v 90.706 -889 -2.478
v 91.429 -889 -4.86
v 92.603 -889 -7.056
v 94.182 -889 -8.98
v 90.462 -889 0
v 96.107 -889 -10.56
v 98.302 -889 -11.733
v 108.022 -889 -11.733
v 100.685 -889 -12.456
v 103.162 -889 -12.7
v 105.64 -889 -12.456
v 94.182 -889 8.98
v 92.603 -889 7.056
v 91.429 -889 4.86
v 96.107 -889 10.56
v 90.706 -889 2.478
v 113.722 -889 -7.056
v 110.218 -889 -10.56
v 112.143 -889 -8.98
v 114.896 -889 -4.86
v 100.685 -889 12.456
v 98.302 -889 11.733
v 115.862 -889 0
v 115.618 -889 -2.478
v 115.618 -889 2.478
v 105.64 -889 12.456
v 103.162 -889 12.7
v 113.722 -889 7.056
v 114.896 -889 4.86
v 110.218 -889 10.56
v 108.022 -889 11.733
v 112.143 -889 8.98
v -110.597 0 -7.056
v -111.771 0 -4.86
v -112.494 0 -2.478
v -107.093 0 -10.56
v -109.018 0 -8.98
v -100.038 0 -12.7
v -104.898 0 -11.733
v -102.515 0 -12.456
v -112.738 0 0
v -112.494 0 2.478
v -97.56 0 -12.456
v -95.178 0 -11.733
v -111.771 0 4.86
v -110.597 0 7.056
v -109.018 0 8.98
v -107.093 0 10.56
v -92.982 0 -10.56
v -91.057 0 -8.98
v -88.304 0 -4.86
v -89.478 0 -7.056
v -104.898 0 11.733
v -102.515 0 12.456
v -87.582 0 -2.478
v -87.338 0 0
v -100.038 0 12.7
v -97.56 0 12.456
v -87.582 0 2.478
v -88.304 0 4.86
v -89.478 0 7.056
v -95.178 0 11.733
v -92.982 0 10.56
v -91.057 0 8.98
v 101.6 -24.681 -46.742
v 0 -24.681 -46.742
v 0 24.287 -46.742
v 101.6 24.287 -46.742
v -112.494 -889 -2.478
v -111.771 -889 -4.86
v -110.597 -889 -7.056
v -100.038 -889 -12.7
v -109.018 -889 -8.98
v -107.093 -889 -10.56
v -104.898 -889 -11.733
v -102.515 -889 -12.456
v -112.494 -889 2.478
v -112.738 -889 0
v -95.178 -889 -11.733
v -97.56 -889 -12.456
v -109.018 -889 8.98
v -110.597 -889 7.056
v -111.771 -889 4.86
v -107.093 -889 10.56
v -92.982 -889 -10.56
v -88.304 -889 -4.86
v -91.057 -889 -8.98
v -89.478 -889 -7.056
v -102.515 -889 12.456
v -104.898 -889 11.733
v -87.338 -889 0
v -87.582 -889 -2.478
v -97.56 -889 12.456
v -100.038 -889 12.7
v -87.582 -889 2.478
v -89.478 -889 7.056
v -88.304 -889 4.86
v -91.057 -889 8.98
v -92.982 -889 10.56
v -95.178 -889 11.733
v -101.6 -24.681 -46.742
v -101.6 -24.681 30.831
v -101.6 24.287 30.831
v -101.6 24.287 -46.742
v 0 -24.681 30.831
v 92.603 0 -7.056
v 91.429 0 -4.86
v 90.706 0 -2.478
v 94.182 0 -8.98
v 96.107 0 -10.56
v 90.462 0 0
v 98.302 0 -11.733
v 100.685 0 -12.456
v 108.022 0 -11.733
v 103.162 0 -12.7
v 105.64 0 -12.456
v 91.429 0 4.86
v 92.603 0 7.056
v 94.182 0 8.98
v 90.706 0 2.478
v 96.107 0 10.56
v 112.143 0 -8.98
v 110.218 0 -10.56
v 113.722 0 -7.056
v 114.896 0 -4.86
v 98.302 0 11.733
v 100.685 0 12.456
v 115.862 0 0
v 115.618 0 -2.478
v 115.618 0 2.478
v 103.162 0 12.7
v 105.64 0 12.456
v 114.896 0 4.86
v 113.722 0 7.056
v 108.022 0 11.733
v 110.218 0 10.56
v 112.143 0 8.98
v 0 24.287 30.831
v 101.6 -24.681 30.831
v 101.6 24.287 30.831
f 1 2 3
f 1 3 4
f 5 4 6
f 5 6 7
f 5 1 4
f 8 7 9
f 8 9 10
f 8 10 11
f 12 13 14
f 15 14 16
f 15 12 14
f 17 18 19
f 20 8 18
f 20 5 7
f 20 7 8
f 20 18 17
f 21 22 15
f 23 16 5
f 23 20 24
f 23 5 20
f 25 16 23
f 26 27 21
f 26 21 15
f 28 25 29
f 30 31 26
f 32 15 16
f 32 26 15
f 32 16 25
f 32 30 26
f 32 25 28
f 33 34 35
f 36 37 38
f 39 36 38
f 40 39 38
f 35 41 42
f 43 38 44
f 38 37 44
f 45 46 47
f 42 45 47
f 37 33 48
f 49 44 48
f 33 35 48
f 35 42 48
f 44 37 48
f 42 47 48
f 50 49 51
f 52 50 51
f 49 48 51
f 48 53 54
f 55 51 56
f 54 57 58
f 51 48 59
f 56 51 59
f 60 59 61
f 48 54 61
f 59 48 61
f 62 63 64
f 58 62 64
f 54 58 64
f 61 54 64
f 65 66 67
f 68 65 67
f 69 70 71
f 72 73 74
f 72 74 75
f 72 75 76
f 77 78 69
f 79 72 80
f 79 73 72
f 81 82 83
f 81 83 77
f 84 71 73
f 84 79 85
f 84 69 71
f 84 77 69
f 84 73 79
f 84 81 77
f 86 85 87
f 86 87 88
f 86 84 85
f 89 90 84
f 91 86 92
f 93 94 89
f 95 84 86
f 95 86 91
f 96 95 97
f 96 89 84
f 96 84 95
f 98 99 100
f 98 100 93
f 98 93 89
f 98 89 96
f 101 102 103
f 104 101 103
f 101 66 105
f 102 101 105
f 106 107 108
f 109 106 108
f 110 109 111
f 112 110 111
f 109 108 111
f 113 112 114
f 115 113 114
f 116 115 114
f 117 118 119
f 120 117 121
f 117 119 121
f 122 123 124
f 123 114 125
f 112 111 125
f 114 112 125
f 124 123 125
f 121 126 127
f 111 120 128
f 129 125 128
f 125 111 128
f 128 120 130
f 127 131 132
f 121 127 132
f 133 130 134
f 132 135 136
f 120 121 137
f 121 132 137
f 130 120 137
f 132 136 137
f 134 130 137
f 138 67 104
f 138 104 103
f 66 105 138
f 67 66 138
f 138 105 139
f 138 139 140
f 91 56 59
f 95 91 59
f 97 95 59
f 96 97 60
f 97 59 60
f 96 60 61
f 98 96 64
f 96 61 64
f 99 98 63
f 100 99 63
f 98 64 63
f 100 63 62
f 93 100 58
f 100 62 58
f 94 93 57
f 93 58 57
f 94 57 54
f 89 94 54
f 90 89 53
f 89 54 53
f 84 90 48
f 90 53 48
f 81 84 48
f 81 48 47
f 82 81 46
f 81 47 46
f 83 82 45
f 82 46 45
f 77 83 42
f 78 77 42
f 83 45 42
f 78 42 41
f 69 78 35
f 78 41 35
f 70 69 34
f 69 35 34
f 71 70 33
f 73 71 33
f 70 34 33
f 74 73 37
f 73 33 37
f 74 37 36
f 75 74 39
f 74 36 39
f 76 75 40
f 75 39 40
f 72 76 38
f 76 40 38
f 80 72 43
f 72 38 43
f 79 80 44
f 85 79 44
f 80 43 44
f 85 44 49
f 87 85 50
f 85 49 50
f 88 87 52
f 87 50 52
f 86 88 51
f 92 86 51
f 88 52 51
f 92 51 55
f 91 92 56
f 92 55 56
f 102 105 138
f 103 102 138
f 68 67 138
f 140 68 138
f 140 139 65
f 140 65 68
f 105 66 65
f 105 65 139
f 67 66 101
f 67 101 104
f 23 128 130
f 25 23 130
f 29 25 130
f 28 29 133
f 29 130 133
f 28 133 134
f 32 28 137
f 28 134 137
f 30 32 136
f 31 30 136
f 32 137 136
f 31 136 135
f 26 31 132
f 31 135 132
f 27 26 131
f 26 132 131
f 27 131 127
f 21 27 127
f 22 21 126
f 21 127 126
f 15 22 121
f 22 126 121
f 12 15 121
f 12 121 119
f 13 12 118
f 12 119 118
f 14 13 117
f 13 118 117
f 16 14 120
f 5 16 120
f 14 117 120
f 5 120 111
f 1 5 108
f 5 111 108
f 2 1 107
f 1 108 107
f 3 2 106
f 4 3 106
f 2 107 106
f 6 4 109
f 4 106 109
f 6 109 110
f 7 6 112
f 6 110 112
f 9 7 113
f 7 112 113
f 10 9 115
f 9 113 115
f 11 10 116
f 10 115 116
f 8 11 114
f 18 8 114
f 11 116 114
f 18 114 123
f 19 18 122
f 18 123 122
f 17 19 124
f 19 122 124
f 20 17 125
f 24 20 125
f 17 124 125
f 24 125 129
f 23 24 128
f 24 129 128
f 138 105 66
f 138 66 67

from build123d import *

# Parameters (mm, degrees)
F0_R     = 12.7
F1_DEPTH = 889
F2_W     = 48.9672906697
F2_H     = 77.5736253709
F3_DEPTH = 101.6
F5_DEPTH = 101.6


with BuildPart() as f1:
    # F0 (on Front) → F1 (new body)
    with BuildSketch(Plane.XZ):
        with Locations((-100.0376567245, 0)):
            Circle(F0_R)
    extrude(amount=F1_DEPTH)


with BuildPart() as f1b:
    # F0 (on Front) → F1, piece 2 (new body)
    with BuildSketch(Plane.XZ):
        with Locations((103.1623432755, 0)):
            Circle(F0_R)
    extrude(amount=F1_DEPTH)


with BuildPart() as f3:
    # F2 (on Right) → F3 (new body)
    with BuildSketch(Plane.YZ):
        with Locations((-0.1971311867, -7.9556787387)):
            Rectangle(F2_W, F2_H)
    extrude(amount=-F3_DEPTH)


with BuildPart() as f5:
    # F5 (new): a face of the model
    f5_faces = [f3.part.faces().sort_by_distance(p)[0] for p in [
        (0, -0.1971311867, -7.9556787387),
    ]]
    extrude(f5_faces, amount=F5_DEPTH)


solid = Compound([f1.part, f1b.part, f3.part, f5.part])
